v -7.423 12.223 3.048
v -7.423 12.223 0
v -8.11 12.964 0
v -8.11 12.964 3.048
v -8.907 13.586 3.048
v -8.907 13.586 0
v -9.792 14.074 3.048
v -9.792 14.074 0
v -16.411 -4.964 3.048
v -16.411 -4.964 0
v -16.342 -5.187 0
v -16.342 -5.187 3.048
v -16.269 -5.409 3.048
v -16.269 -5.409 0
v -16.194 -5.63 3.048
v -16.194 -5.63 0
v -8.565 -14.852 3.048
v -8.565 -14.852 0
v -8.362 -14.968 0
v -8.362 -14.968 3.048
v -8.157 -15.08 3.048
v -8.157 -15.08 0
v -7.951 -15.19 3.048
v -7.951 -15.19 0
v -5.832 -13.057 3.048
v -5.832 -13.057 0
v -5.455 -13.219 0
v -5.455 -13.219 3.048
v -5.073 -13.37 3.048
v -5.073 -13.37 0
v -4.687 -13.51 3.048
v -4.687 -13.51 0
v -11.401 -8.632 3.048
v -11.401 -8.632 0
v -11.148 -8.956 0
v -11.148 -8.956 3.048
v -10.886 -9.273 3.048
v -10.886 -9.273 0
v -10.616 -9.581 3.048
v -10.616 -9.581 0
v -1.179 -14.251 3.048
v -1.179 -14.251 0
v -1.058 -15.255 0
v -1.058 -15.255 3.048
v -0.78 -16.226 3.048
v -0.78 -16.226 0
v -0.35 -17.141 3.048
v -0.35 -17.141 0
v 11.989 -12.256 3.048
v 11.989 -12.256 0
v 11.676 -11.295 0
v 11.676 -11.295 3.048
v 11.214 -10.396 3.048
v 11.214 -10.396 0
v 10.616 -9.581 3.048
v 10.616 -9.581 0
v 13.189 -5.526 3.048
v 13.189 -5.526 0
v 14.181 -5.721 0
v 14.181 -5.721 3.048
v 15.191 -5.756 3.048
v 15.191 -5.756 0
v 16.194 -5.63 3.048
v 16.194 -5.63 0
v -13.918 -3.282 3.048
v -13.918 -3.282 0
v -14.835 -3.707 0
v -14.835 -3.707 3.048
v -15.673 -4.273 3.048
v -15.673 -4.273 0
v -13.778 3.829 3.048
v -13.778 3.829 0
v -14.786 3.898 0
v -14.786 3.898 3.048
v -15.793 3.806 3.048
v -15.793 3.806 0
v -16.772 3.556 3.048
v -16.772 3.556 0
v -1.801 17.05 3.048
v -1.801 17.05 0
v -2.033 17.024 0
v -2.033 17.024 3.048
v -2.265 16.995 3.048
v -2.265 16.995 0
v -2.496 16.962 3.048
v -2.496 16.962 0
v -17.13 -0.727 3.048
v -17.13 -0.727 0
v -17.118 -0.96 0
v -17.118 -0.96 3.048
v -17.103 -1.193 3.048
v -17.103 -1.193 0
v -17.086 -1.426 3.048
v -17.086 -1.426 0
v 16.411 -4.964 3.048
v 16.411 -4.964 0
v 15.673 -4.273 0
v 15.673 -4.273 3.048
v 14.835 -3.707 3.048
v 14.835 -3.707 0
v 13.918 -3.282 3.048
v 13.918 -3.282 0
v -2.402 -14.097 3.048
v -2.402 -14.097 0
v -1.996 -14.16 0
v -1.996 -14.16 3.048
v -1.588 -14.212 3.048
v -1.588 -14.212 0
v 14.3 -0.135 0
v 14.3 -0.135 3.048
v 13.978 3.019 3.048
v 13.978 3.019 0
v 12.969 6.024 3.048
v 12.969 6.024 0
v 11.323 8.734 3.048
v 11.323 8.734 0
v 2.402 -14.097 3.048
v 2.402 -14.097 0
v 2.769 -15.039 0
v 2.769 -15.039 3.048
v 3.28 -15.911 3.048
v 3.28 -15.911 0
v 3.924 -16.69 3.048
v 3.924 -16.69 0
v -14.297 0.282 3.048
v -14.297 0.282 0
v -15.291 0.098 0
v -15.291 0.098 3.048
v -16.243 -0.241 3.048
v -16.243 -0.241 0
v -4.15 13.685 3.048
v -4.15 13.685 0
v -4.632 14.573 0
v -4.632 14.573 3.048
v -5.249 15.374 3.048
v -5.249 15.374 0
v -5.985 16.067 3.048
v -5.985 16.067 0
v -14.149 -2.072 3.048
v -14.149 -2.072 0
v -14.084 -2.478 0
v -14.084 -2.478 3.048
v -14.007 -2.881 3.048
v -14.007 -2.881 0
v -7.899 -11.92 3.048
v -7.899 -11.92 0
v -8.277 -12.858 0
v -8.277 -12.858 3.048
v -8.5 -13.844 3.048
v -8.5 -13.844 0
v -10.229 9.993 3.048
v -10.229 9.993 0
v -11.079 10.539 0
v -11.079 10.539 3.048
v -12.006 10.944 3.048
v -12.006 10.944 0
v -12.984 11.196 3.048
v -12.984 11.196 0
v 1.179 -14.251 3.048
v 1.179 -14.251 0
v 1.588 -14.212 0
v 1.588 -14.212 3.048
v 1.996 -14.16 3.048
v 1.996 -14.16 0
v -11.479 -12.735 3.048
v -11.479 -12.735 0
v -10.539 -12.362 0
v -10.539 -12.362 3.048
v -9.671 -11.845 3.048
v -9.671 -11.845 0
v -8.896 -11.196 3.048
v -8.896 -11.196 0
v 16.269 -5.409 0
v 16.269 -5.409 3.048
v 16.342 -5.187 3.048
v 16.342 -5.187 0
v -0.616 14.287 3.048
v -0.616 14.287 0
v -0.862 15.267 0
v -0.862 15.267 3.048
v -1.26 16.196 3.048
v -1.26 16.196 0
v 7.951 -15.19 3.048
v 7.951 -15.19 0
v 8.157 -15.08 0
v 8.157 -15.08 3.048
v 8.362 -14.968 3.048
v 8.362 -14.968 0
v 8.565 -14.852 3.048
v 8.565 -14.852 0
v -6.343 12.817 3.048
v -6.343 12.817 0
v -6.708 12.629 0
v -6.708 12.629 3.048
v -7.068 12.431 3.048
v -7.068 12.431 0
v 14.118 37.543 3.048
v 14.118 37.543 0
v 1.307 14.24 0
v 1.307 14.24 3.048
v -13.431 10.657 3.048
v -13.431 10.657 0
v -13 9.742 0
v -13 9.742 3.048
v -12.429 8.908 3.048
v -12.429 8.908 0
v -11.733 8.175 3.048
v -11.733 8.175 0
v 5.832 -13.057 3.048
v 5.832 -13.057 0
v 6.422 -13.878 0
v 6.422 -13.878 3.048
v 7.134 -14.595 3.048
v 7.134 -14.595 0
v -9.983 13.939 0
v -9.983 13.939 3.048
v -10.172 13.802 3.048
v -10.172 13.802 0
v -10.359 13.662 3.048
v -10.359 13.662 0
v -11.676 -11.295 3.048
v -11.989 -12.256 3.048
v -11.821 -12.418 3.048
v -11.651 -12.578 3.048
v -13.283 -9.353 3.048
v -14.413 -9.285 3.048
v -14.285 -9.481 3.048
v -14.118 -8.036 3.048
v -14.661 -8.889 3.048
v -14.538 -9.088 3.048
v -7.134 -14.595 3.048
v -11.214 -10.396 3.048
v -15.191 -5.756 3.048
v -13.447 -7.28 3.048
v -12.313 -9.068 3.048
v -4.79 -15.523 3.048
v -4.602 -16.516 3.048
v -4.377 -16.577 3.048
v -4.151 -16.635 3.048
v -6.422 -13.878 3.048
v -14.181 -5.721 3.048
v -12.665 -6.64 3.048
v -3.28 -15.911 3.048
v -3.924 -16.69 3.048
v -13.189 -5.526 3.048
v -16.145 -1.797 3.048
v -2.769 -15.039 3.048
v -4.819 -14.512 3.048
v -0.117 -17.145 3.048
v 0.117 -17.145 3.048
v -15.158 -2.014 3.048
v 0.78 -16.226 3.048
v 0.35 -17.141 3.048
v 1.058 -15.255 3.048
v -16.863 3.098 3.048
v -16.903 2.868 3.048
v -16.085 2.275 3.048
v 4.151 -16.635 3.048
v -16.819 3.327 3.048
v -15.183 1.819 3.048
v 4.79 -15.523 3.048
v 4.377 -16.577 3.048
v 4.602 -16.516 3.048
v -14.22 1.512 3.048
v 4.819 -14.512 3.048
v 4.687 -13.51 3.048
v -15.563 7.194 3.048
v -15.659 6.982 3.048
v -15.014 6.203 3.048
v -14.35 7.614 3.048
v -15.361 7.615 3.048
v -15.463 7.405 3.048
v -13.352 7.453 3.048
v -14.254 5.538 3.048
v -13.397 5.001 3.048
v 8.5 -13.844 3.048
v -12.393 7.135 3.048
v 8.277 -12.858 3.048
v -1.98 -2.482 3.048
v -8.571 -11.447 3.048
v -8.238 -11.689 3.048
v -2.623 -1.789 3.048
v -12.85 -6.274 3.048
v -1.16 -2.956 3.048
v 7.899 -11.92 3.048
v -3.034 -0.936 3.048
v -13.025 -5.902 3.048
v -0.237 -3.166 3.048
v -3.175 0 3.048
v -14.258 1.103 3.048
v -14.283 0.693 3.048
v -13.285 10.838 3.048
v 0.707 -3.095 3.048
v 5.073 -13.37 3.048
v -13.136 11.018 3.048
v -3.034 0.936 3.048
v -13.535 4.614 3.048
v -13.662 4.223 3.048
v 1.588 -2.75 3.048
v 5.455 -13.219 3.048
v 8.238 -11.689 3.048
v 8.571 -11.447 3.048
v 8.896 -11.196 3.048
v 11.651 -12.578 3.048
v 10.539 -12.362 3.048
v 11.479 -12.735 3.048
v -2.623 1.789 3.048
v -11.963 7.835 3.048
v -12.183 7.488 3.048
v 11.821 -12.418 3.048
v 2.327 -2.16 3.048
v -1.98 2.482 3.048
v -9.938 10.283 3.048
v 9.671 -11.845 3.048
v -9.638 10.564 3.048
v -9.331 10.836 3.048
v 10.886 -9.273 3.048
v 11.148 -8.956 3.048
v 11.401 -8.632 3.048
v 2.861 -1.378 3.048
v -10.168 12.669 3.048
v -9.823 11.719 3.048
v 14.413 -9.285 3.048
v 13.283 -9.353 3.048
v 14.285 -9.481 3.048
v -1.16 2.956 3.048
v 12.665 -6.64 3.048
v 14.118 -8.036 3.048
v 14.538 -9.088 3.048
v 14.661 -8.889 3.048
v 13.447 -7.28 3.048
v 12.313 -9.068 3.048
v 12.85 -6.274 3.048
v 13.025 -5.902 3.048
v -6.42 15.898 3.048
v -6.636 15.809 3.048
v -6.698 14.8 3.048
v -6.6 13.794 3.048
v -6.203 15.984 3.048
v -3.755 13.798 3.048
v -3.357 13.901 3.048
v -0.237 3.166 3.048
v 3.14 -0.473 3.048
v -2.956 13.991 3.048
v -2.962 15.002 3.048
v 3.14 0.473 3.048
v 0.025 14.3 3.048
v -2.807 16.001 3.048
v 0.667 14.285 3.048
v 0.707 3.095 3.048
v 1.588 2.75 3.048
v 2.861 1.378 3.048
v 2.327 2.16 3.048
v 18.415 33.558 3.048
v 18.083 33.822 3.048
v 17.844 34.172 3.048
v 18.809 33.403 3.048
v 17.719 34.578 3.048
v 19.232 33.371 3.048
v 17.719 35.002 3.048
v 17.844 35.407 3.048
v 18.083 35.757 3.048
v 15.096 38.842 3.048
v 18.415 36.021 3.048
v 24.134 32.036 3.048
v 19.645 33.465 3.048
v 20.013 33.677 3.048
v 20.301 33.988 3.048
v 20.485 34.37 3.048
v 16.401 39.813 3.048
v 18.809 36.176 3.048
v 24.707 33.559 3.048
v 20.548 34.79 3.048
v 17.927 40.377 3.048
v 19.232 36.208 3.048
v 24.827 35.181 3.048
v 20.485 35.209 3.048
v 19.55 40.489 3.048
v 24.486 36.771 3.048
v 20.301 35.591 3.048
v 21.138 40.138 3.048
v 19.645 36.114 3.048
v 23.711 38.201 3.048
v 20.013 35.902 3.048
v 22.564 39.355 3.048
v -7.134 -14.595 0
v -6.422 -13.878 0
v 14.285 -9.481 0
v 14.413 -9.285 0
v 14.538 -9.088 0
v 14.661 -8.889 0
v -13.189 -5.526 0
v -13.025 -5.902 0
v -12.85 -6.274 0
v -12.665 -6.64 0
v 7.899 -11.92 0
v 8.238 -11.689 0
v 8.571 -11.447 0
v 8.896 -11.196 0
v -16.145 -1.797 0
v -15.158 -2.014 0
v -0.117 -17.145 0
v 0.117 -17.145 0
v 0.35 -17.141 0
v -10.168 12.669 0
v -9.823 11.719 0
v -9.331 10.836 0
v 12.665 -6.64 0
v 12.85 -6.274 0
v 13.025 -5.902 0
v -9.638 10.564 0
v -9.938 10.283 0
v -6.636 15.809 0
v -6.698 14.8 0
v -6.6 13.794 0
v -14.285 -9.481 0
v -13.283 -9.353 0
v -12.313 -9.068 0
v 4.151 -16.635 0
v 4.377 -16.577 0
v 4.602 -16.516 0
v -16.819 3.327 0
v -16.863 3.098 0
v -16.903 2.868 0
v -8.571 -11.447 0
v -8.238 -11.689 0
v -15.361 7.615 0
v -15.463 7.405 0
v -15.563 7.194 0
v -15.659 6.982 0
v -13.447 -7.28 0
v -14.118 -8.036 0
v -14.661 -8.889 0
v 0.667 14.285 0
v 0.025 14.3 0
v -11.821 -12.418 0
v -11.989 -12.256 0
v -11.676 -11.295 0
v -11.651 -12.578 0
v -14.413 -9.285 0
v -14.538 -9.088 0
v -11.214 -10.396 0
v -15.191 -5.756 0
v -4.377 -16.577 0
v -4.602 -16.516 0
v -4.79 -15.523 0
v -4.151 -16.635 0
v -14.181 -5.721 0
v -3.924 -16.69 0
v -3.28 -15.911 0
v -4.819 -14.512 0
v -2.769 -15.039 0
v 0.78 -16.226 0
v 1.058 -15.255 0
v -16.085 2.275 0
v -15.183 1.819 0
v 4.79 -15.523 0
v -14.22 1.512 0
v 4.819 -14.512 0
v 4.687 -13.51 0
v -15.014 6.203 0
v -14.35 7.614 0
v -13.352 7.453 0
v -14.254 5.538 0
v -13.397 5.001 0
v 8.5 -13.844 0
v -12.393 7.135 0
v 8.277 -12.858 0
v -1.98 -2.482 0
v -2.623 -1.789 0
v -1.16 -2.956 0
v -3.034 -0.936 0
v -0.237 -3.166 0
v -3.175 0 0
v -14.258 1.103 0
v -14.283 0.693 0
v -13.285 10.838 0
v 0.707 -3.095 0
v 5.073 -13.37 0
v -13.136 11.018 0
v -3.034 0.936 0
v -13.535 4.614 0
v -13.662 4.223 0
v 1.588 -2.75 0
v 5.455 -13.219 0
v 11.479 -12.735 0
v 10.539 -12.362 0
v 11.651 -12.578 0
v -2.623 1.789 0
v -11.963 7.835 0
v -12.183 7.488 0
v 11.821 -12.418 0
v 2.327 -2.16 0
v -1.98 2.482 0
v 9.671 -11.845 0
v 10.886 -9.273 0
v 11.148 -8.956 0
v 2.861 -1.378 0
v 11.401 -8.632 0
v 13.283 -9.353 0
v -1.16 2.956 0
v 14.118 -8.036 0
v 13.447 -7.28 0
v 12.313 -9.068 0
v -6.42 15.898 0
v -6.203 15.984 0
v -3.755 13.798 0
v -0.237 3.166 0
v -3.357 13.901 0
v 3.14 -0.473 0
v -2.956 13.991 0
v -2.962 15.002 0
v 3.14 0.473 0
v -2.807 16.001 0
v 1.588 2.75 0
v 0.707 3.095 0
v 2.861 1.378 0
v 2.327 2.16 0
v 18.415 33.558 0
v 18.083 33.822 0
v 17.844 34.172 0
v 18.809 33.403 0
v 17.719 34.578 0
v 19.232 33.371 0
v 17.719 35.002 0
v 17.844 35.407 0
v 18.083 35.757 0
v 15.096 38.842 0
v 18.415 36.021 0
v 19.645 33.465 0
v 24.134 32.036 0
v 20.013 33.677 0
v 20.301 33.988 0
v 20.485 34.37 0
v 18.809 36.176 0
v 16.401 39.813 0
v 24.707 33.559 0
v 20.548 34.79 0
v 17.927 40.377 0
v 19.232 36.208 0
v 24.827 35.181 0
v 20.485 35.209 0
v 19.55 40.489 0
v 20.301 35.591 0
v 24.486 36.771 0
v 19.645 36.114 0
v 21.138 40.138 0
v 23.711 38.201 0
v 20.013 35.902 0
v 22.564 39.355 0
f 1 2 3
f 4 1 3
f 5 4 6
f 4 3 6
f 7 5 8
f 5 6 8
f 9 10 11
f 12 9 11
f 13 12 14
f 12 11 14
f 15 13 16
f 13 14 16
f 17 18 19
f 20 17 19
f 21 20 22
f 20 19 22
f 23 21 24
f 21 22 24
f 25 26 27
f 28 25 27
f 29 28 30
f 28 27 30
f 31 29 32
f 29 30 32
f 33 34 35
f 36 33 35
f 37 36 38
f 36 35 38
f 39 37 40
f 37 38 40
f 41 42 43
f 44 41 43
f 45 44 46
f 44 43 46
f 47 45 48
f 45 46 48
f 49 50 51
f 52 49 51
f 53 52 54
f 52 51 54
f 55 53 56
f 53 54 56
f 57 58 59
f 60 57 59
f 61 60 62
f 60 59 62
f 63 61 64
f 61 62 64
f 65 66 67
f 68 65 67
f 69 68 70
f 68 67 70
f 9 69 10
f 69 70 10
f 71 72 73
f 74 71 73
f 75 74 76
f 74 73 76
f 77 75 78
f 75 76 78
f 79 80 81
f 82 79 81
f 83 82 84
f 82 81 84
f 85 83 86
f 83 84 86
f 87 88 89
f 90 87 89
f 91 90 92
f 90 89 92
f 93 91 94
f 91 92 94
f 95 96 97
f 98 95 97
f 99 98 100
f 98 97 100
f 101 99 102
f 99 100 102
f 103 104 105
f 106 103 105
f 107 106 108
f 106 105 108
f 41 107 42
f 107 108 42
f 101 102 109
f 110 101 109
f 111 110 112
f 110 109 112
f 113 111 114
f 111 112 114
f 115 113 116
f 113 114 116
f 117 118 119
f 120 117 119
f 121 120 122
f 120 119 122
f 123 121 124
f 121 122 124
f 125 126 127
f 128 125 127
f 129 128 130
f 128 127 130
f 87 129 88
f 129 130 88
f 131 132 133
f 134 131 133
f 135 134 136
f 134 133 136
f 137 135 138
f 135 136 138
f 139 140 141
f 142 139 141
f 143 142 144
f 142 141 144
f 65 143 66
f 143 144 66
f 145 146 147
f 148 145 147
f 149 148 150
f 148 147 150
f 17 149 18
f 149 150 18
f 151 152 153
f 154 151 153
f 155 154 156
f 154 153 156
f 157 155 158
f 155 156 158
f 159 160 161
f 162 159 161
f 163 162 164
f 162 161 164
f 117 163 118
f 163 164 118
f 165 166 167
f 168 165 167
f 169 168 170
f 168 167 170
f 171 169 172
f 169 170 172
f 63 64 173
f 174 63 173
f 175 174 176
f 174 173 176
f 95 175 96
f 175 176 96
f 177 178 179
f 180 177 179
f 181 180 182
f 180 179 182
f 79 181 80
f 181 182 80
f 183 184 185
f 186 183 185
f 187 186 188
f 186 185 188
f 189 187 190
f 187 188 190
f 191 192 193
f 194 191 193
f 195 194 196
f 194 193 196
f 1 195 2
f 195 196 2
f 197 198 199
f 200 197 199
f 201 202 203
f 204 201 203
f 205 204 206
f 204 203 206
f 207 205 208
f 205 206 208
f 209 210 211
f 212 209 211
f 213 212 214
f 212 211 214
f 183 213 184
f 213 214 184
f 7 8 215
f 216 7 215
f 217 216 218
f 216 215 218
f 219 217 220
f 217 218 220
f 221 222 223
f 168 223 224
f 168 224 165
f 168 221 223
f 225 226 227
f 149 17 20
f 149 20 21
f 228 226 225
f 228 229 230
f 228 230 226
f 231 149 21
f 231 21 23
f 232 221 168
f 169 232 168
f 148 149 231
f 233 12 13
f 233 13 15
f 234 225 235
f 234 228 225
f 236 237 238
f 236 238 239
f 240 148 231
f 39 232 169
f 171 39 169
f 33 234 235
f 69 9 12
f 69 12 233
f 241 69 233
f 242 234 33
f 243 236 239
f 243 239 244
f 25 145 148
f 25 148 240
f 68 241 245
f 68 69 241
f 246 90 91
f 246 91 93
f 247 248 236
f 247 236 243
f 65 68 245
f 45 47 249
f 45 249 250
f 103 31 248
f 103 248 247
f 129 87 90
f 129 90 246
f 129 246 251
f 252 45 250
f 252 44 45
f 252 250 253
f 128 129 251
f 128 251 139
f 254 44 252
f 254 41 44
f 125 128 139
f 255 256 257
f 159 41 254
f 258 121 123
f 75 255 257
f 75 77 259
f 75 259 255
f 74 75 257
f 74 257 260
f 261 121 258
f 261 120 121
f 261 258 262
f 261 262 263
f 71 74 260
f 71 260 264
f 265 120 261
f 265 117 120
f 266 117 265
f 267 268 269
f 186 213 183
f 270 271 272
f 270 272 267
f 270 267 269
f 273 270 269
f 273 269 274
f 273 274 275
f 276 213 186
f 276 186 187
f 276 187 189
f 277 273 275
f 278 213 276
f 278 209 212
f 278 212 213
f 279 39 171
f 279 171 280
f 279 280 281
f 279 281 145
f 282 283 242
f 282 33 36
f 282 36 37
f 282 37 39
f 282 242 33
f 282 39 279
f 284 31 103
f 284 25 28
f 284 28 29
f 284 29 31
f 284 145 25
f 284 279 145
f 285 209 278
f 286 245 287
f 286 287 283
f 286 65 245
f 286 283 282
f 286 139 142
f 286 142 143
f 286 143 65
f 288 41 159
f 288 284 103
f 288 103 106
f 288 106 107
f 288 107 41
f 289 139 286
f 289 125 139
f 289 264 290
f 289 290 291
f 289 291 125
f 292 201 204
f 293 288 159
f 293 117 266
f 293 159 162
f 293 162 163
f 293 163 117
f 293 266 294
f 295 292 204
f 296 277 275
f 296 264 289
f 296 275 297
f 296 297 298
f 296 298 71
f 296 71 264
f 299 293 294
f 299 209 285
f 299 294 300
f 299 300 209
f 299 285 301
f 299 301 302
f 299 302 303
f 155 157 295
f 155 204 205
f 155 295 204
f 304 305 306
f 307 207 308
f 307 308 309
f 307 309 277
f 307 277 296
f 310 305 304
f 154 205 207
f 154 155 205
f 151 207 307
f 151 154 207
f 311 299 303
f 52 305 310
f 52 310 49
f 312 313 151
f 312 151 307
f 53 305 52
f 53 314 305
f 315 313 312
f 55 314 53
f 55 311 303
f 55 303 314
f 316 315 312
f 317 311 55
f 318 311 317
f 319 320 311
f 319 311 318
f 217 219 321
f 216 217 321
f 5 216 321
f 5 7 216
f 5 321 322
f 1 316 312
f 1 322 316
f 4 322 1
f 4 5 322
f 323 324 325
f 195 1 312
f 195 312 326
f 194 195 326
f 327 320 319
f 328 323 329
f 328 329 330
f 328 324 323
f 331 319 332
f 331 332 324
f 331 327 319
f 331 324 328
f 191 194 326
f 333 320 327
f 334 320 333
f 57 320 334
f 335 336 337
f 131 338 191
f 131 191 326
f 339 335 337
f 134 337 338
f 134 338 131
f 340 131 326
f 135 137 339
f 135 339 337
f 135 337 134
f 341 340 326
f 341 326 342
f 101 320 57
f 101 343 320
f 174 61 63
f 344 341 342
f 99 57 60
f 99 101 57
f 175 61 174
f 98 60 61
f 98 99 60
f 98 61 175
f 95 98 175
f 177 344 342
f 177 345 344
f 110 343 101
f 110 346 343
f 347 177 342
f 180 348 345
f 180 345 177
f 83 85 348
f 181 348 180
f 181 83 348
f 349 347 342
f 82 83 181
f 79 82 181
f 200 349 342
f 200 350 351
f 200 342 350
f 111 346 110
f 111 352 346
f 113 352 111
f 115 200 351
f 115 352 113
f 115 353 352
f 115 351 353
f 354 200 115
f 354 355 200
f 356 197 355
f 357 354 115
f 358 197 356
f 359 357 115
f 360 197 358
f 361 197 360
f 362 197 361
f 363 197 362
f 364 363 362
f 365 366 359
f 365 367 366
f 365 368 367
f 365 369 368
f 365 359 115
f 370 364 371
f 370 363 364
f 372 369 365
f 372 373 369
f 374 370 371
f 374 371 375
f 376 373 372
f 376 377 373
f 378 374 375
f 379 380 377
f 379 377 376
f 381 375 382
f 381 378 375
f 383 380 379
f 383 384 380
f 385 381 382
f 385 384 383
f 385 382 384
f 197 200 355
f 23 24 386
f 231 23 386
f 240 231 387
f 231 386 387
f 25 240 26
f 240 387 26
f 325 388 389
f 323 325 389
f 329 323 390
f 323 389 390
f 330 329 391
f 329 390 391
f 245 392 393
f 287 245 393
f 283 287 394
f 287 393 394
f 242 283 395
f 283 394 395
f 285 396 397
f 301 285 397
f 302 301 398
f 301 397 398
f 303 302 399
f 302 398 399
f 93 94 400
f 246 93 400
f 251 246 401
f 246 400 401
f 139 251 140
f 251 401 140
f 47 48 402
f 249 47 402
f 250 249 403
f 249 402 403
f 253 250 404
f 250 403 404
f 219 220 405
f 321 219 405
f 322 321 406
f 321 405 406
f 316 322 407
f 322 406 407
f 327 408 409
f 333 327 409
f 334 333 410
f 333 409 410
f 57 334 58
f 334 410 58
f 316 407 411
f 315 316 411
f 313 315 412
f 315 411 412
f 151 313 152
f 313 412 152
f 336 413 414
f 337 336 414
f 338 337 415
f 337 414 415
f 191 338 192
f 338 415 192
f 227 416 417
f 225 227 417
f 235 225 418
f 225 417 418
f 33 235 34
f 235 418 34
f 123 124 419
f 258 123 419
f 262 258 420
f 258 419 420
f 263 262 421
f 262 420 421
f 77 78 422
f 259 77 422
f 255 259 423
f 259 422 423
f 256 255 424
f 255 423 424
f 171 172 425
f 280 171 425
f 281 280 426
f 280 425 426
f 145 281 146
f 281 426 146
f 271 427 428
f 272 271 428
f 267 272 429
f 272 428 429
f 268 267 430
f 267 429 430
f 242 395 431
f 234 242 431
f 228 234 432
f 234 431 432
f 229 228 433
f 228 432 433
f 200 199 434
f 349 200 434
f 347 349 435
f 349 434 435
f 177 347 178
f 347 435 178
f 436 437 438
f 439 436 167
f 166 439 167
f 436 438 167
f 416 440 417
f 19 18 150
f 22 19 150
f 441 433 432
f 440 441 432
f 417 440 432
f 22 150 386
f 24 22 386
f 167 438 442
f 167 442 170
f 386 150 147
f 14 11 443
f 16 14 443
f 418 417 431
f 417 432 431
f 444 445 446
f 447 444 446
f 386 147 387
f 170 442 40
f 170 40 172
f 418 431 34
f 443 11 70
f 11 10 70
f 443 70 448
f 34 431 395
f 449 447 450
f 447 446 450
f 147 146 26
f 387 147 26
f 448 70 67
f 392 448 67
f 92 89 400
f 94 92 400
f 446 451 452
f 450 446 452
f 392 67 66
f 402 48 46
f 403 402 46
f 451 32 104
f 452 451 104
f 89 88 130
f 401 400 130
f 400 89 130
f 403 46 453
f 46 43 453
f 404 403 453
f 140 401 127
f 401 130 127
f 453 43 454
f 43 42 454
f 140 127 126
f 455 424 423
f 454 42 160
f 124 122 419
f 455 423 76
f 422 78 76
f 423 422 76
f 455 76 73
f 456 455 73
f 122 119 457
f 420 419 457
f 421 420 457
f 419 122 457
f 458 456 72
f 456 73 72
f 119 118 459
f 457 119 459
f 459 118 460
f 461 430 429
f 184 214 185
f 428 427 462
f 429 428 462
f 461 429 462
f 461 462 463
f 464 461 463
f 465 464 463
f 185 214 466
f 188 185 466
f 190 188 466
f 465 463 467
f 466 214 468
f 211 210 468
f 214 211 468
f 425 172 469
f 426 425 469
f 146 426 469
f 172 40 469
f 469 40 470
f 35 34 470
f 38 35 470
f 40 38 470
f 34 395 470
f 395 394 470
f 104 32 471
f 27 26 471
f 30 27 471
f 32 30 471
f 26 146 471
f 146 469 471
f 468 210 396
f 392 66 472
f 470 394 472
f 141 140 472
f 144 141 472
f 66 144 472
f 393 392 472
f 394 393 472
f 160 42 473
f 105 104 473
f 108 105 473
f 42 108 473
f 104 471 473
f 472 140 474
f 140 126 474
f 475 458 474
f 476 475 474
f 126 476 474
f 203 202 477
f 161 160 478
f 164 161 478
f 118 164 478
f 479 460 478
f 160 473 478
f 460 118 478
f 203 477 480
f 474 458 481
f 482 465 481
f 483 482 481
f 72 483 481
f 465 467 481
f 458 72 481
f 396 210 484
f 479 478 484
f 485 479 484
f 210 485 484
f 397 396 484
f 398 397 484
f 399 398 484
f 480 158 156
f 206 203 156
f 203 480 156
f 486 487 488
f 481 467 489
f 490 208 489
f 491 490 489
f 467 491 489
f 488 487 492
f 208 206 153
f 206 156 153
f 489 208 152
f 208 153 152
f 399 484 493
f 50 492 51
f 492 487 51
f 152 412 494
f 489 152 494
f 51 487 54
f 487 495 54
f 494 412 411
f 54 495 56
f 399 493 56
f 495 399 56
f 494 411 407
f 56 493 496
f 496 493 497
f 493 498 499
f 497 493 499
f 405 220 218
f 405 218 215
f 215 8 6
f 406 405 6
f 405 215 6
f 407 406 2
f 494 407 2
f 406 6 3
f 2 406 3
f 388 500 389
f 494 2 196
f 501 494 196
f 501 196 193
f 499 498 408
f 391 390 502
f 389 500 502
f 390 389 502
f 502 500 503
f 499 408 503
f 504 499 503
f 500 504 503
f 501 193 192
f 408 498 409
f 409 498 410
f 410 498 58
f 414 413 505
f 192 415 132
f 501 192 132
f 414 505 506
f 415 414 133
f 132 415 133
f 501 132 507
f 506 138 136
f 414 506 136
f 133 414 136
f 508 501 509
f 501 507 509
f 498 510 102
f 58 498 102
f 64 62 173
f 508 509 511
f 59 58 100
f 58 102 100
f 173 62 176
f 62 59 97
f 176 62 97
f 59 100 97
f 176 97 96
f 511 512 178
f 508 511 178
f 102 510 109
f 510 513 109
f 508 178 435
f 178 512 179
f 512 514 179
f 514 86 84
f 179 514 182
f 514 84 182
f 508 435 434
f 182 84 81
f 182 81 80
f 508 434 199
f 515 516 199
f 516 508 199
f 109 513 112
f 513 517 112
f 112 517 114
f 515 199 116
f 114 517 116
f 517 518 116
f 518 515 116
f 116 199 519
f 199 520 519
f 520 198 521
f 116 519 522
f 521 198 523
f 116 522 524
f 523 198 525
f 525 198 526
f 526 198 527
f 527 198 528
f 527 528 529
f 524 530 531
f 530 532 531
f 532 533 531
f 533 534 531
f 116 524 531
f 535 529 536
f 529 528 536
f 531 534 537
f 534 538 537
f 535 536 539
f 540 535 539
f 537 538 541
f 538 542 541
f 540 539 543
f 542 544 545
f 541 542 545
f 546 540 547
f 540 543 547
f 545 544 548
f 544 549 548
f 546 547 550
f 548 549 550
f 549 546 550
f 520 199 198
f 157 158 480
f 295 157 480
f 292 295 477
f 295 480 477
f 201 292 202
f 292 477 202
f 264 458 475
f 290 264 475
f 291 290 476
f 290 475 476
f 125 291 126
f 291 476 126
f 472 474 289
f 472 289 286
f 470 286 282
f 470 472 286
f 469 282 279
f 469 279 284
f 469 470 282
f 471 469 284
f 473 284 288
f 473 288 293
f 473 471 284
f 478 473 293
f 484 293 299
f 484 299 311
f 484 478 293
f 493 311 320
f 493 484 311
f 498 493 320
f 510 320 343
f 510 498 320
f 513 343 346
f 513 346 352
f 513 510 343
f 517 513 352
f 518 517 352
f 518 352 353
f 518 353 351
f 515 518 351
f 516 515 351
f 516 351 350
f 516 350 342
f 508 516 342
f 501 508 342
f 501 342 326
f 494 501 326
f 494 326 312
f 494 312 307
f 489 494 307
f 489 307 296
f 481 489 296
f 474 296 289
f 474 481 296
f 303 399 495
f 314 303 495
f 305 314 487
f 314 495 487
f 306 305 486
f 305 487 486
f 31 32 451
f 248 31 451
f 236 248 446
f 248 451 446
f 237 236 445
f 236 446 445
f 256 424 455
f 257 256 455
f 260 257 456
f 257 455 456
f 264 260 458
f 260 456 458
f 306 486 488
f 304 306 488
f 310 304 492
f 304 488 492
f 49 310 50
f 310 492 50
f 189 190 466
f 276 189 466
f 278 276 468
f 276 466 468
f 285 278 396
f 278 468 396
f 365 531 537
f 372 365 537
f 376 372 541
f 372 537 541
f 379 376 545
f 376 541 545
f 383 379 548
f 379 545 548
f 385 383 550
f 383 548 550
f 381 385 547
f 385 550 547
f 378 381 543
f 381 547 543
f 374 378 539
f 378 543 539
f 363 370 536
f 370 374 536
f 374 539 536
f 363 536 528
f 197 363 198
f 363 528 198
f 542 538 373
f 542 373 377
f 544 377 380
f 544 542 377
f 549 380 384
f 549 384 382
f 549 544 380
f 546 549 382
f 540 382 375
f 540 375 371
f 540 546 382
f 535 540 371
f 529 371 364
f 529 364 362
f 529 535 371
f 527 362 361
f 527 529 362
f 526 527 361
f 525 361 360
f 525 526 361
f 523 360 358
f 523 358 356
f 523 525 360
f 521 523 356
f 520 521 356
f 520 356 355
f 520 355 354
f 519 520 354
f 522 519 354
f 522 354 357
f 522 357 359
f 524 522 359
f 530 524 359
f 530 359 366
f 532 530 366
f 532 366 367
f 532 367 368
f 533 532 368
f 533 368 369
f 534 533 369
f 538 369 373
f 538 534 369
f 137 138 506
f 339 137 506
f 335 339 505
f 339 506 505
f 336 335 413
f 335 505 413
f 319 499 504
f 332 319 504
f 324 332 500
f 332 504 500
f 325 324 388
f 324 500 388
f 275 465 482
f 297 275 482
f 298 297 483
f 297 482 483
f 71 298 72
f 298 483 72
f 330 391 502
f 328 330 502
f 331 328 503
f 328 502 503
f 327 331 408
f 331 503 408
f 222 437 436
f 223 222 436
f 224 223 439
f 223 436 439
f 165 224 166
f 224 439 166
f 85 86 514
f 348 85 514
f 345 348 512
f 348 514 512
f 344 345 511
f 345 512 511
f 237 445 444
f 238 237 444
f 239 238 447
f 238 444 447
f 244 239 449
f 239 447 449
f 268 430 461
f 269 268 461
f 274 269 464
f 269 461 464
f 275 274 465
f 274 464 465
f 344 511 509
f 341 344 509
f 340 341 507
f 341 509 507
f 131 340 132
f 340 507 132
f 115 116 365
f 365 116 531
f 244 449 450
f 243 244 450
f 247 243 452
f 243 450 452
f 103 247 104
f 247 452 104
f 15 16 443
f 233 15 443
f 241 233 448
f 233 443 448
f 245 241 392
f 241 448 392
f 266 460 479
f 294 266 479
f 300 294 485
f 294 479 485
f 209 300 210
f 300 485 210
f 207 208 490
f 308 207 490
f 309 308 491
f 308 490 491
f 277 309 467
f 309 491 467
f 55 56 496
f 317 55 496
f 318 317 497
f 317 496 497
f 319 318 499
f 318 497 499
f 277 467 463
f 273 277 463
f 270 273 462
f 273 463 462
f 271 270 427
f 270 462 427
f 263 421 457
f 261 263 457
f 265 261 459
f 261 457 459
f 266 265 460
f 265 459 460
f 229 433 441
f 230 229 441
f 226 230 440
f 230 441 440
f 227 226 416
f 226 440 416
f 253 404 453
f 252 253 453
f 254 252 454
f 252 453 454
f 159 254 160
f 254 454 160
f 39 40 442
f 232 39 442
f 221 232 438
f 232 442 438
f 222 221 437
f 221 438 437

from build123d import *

# Parameters (mm, degrees)
MODEL_R             = 3.175
BOSS_EXTRUDE1_DEPTH = 3.048
BOSS_EXTRUDE2_START = -3.048
SKETCH2_R           = 5.715
SKETCH2_R_2         = 1.4224
BOSS_EXTRUDE2_DEPTH = 3.048


with BuildPart() as part:
    # Model → Boss-Extrude1 (new body)
    with BuildSketch(Plane.XY):
        with BuildLine():
            ThreePointArc((-0.616026415, 14.286925194), (-1.042592722, 15.739677645), (-1.800954663, 17.050149187))
            ThreePointArc((-1.800954663, 17.050149187), (-2.148838289, 17.009806554), (-2.495825317, 16.962366609))
            ThreePointArc((-2.495825317, 16.962366609), (-2.904460903, 15.504468994), (-2.956341002, 13.991274707))
            ThreePointArc((-2.956341002, 13.991274707), (-3.556315124, 13.850932921), (-4.149686627, 13.684875627))
            ThreePointArc((-4.149686627, 13.684875627), (-4.924136412, 14.985904462), (-5.984574038, 16.066608185))
            ThreePointArc((-5.984574038, 16.066608185), (-6.311495456, 15.941017851), (-6.635783413, 15.808776154))
            ThreePointArc((-6.635783413, 15.808776154), (-6.669016568, 14.295057536), (-6.342950641, 12.816500973))
            ThreePointArc((-6.342950641, 12.816500973), (-6.88917389, 12.531360786), (-7.422606766, 12.222954996))
            ThreePointArc((-7.422606766, 12.222954996), (-8.496278501, 13.290511787), (-9.792160616, 14.073543103))
            ThreePointArc((-9.792160616, 14.073543103), (-10.077578151, 13.870596369), (-10.358790833, 13.661862153))
            ThreePointArc((-10.358790833, 13.661862153), (-10.014533394, 12.187435039), (-9.331009364, 10.836419348))
            ThreePointArc((-9.331009364, 10.836419348), (-9.789160524, 10.424397166), (-10.229137224, 9.993021149))
            ThreePointArc((-10.229137224, 9.993021149), (-11.534568165, 10.760027378), (-12.98446973, 11.196185548))
            ThreePointArc((-12.98446973, 11.196185548), (-13.210449547, 10.928634304), (-13.430917328, 10.656523107))
            ThreePointArc((-13.430917328, 10.656523107), (-12.730800257, 9.314031176), (-11.732766451, 8.175445642))
            ThreePointArc((-11.732766451, 8.175445642), (-12.0740582, 7.662430334), (-12.39293337, 7.135189032))
            ThreePointArc((-12.39293337, 7.135189032), (-13.84809849, 7.553450876), (-15.360916858, 7.615330478))
            ThreePointArc((-15.360916858, 7.615330478), (-15.513259815, 7.299985954), (-15.659129891, 6.981595523))
            ThreePointArc((-15.659129891, 6.981595523), (-14.647144119, 5.85539248), (-13.397310672, 5.000778618))
            ThreePointArc((-13.397310672, 5.000778618), (-13.600298394, 4.419004823), (-13.778035935, 3.829026746))
            ThreePointArc((-13.778035935, 3.829026746), (-15.291501858, 3.872263276), (-16.772181085, 3.555976188))
            ThreePointArc((-16.772181085, 3.555976188), (-16.841314914, 3.212652639), (-16.903421733, 2.867988616))
            ThreePointArc((-16.903421733, 2.867988616), (-15.643154047, 2.02883794), (-14.220052592, 1.511894283))
            ThreePointArc((-14.220052592, 1.511894283), (-14.271981822, 0.897916987), (-14.297413829, 0.282272628))
            ThreePointArc((-14.297413829, 0.282272628), (-15.774083925, -0.052232867), (-17.129587491, -0.726813165))
            ThreePointArc((-17.129587491, -0.726813165), (-17.111168259, -1.076543457), (-17.085609422, -1.425824564))
            ThreePointArc((-17.085609422, -1.425824564), (-15.656247076, -1.92519595), (-14.14929631, -2.071987931))
            ThreePointArc((-14.14929631, -2.071987931), (-14.046904143, -2.679590275), (-13.918432631, -3.282217718))
            ThreePointArc((-13.918432631, -3.282217718), (-15.265522286, -3.973447027), (-16.410678917, -4.963934173))
            ThreePointArc((-16.410678917, -4.963934173), (-16.305863972, -5.298096369), (-16.194245434, -5.630047943))
            ThreePointArc((-16.194245434, -5.630047943), (-14.68560052, -5.758262697), (-13.189487703, -5.525679522))
            ThreePointArc((-13.189487703, -5.525679522), (-12.939207816, -6.088729025), (-12.664905121, -6.640474253))
            ThreePointArc((-12.664905121, -6.640474253), (-13.797771739, -7.644994897), (-14.660627033, -8.889152941))
            ThreePointArc((-14.660627033, -8.889152941), (-14.476002283, -9.1867504), (-14.285337446, -9.480514703))
            ThreePointArc((-14.285337446, -9.480514703), (-12.792203675, -9.229516622), (-11.400935076, -8.632172348))
            ThreePointArc((-11.400935076, -8.632172348), (-11.018493474, -9.115290538), (-10.615595045, -9.581485369))
            ThreePointArc((-10.615595045, -9.581485369), (-11.46305645, -10.836179621), (-11.989394033, -12.255833538))
            ThreePointArc((-11.989394033, -12.255833538), (-11.736560131, -12.498167117), (-11.47882917, -12.735285858))
            ThreePointArc((-11.47882917, -12.735285858), (-10.095025626, -12.120846074), (-8.896019768, -11.196274037))
            ThreePointArc((-8.896019768, -11.196274037), (-8.405446665, -11.569104823), (-7.899268091, -11.920456521))
            ThreePointArc((-7.899268091, -11.920456521), (-8.408075165, -13.346487327), (-8.564823313, -14.85243504))
            ThreePointArc((-8.564823313, -14.85243504), (-8.259666742, -15.024278029), (-7.95106384, -15.189852165))
            ThreePointArc((-7.95106384, -15.189852165), (-6.76353999, -14.25057819), (-5.832134822, -13.056872652))
            ThreePointArc((-5.832134822, -13.056872652), (-5.264254728, -13.295989703), (-4.686601071, -13.510421549))
            ThreePointArc((-4.686601071, -13.510421549), (-4.824783595, -15.018186149), (-4.602093245, -16.515803425))
            ThreePointArc((-4.602093245, -16.515803425), (-4.263788115, -16.606358298), (-3.923703928, -16.689984197))
            ThreePointArc((-3.923703928, -16.689984197), (-3.007076261, -15.484894068), (-2.401795395, -14.097059939))
            ThreePointArc((-2.401795395, -14.097059939), (-1.792290307, -14.187438652), (-1.17945767, -14.251477104))
            ThreePointArc((-1.17945767, -14.251477104), (-0.938333127, -15.746237102), (-0.350196733, -17.14142314))
            ThreePointArc((-0.350196733, -17.14142314), (0, -17.145), (0.350196733, -17.14142314))
            ThreePointArc((0.350196733, -17.14142314), (0.938333127, -15.746237102), (1.17945767, -14.251477104))
            ThreePointArc((1.17945767, -14.251477104), (1.792290307, -14.187438652), (2.401795395, -14.097059939))
            ThreePointArc((2.401795395, -14.097059939), (3.007076261, -15.484894068), (3.923703928, -16.689984197))
            ThreePointArc((3.923703928, -16.689984197), (4.263788115, -16.606358298), (4.602093245, -16.515803425))
            ThreePointArc((4.602093245, -16.515803425), (4.824783595, -15.018186149), (4.686601071, -13.510421549))
            ThreePointArc((4.686601071, -13.510421549), (5.264254728, -13.295989704), (5.832134822, -13.056872652))
            ThreePointArc((5.832134822, -13.056872652), (6.76353999, -14.25057819), (7.95106384, -15.189852165))
            ThreePointArc((7.95106384, -15.189852165), (8.259666742, -15.024278029), (8.564823313, -14.85243504))
            ThreePointArc((8.564823313, -14.85243504), (8.408075165, -13.346487327), (7.899268091, -11.920456521))
            ThreePointArc((7.899268091, -11.920456521), (8.405446665, -11.569104823), (8.896019768, -11.196274037))
            ThreePointArc((8.896019768, -11.196274037), (10.095025626, -12.120846074), (11.47882917, -12.735285858))
            ThreePointArc((11.47882917, -12.735285858), (11.736560131, -12.498167117), (11.989394033, -12.255833538))
            ThreePointArc((11.989394033, -12.255833538), (11.46305645, -10.836179621), (10.615595045, -9.581485369))
            ThreePointArc((10.615595045, -9.581485369), (11.018493474, -9.115290538), (11.400935076, -8.632172348))
            ThreePointArc((11.400935076, -8.632172348), (12.792203675, -9.229516622), (14.285337446, -9.480514703))
            ThreePointArc((14.285337446, -9.480514703), (14.476002283, -9.1867504), (14.660627033, -8.889152941))
            ThreePointArc((14.660627033, -8.889152941), (13.797771739, -7.644994897), (12.664905121, -6.640474253))
            ThreePointArc((12.664905121, -6.640474253), (12.939207816, -6.088729025), (13.189487703, -5.525679522))
            ThreePointArc((13.189487703, -5.525679522), (14.68560052, -5.758262697), (16.194245434, -5.630047943))
            ThreePointArc((16.194245434, -5.630047943), (16.305863972, -5.298096369), (16.410678917, -4.963934173))
            ThreePointArc((16.410678917, -4.963934173), (15.265522286, -3.973447027), (13.918432631, -3.282217718))
            ThreePointArc((13.918432631, -3.282217718), (11.018493474, 9.115290538), (-0.616026415, 14.286925194))
        make_face()
        with Locations(Location((0, 0, 0), (0, 0, 180))):
            Circle(MODEL_R, mode=Mode.SUBTRACT)
    extrude(amount=BOSS_EXTRUDE1_DEPTH)

    # Sketch2 → Boss-Extrude2 (add)
    # profile 1 of 2: a face of its own
    with BuildSketch(Plane.XY.offset(3.048).offset(BOSS_EXTRUDE2_START)):
        with BuildLine():
            Line((14.117624536, 37.542772707), (1.307007018, 14.240345947))
            ThreePointArc((1.307007018, 14.240345947), (6.88917389, 12.531360786), (11.323192371, 8.733901452))
            Line((11.323192371, 8.733901452), (24.133809889, 32.036328212))
            ThreePointArc((24.133809889, 32.036328212), (16.372494965, 29.781457783), (14.117624536, 37.542772707))
        make_face()
    # profile 2 of 2: a face of its own
    with BuildSketch(Plane.XY.offset(3.048).offset(BOSS_EXTRUDE2_START)):
        with Locations((19.125717213, 34.789550459)):
            Circle(SKETCH2_R)
        with Locations((19.125717213, 34.789550459)):
            Circle(SKETCH2_R_2, mode=Mode.SUBTRACT)
    extrude(amount=BOSS_EXTRUDE2_DEPTH)


solid = part.part
